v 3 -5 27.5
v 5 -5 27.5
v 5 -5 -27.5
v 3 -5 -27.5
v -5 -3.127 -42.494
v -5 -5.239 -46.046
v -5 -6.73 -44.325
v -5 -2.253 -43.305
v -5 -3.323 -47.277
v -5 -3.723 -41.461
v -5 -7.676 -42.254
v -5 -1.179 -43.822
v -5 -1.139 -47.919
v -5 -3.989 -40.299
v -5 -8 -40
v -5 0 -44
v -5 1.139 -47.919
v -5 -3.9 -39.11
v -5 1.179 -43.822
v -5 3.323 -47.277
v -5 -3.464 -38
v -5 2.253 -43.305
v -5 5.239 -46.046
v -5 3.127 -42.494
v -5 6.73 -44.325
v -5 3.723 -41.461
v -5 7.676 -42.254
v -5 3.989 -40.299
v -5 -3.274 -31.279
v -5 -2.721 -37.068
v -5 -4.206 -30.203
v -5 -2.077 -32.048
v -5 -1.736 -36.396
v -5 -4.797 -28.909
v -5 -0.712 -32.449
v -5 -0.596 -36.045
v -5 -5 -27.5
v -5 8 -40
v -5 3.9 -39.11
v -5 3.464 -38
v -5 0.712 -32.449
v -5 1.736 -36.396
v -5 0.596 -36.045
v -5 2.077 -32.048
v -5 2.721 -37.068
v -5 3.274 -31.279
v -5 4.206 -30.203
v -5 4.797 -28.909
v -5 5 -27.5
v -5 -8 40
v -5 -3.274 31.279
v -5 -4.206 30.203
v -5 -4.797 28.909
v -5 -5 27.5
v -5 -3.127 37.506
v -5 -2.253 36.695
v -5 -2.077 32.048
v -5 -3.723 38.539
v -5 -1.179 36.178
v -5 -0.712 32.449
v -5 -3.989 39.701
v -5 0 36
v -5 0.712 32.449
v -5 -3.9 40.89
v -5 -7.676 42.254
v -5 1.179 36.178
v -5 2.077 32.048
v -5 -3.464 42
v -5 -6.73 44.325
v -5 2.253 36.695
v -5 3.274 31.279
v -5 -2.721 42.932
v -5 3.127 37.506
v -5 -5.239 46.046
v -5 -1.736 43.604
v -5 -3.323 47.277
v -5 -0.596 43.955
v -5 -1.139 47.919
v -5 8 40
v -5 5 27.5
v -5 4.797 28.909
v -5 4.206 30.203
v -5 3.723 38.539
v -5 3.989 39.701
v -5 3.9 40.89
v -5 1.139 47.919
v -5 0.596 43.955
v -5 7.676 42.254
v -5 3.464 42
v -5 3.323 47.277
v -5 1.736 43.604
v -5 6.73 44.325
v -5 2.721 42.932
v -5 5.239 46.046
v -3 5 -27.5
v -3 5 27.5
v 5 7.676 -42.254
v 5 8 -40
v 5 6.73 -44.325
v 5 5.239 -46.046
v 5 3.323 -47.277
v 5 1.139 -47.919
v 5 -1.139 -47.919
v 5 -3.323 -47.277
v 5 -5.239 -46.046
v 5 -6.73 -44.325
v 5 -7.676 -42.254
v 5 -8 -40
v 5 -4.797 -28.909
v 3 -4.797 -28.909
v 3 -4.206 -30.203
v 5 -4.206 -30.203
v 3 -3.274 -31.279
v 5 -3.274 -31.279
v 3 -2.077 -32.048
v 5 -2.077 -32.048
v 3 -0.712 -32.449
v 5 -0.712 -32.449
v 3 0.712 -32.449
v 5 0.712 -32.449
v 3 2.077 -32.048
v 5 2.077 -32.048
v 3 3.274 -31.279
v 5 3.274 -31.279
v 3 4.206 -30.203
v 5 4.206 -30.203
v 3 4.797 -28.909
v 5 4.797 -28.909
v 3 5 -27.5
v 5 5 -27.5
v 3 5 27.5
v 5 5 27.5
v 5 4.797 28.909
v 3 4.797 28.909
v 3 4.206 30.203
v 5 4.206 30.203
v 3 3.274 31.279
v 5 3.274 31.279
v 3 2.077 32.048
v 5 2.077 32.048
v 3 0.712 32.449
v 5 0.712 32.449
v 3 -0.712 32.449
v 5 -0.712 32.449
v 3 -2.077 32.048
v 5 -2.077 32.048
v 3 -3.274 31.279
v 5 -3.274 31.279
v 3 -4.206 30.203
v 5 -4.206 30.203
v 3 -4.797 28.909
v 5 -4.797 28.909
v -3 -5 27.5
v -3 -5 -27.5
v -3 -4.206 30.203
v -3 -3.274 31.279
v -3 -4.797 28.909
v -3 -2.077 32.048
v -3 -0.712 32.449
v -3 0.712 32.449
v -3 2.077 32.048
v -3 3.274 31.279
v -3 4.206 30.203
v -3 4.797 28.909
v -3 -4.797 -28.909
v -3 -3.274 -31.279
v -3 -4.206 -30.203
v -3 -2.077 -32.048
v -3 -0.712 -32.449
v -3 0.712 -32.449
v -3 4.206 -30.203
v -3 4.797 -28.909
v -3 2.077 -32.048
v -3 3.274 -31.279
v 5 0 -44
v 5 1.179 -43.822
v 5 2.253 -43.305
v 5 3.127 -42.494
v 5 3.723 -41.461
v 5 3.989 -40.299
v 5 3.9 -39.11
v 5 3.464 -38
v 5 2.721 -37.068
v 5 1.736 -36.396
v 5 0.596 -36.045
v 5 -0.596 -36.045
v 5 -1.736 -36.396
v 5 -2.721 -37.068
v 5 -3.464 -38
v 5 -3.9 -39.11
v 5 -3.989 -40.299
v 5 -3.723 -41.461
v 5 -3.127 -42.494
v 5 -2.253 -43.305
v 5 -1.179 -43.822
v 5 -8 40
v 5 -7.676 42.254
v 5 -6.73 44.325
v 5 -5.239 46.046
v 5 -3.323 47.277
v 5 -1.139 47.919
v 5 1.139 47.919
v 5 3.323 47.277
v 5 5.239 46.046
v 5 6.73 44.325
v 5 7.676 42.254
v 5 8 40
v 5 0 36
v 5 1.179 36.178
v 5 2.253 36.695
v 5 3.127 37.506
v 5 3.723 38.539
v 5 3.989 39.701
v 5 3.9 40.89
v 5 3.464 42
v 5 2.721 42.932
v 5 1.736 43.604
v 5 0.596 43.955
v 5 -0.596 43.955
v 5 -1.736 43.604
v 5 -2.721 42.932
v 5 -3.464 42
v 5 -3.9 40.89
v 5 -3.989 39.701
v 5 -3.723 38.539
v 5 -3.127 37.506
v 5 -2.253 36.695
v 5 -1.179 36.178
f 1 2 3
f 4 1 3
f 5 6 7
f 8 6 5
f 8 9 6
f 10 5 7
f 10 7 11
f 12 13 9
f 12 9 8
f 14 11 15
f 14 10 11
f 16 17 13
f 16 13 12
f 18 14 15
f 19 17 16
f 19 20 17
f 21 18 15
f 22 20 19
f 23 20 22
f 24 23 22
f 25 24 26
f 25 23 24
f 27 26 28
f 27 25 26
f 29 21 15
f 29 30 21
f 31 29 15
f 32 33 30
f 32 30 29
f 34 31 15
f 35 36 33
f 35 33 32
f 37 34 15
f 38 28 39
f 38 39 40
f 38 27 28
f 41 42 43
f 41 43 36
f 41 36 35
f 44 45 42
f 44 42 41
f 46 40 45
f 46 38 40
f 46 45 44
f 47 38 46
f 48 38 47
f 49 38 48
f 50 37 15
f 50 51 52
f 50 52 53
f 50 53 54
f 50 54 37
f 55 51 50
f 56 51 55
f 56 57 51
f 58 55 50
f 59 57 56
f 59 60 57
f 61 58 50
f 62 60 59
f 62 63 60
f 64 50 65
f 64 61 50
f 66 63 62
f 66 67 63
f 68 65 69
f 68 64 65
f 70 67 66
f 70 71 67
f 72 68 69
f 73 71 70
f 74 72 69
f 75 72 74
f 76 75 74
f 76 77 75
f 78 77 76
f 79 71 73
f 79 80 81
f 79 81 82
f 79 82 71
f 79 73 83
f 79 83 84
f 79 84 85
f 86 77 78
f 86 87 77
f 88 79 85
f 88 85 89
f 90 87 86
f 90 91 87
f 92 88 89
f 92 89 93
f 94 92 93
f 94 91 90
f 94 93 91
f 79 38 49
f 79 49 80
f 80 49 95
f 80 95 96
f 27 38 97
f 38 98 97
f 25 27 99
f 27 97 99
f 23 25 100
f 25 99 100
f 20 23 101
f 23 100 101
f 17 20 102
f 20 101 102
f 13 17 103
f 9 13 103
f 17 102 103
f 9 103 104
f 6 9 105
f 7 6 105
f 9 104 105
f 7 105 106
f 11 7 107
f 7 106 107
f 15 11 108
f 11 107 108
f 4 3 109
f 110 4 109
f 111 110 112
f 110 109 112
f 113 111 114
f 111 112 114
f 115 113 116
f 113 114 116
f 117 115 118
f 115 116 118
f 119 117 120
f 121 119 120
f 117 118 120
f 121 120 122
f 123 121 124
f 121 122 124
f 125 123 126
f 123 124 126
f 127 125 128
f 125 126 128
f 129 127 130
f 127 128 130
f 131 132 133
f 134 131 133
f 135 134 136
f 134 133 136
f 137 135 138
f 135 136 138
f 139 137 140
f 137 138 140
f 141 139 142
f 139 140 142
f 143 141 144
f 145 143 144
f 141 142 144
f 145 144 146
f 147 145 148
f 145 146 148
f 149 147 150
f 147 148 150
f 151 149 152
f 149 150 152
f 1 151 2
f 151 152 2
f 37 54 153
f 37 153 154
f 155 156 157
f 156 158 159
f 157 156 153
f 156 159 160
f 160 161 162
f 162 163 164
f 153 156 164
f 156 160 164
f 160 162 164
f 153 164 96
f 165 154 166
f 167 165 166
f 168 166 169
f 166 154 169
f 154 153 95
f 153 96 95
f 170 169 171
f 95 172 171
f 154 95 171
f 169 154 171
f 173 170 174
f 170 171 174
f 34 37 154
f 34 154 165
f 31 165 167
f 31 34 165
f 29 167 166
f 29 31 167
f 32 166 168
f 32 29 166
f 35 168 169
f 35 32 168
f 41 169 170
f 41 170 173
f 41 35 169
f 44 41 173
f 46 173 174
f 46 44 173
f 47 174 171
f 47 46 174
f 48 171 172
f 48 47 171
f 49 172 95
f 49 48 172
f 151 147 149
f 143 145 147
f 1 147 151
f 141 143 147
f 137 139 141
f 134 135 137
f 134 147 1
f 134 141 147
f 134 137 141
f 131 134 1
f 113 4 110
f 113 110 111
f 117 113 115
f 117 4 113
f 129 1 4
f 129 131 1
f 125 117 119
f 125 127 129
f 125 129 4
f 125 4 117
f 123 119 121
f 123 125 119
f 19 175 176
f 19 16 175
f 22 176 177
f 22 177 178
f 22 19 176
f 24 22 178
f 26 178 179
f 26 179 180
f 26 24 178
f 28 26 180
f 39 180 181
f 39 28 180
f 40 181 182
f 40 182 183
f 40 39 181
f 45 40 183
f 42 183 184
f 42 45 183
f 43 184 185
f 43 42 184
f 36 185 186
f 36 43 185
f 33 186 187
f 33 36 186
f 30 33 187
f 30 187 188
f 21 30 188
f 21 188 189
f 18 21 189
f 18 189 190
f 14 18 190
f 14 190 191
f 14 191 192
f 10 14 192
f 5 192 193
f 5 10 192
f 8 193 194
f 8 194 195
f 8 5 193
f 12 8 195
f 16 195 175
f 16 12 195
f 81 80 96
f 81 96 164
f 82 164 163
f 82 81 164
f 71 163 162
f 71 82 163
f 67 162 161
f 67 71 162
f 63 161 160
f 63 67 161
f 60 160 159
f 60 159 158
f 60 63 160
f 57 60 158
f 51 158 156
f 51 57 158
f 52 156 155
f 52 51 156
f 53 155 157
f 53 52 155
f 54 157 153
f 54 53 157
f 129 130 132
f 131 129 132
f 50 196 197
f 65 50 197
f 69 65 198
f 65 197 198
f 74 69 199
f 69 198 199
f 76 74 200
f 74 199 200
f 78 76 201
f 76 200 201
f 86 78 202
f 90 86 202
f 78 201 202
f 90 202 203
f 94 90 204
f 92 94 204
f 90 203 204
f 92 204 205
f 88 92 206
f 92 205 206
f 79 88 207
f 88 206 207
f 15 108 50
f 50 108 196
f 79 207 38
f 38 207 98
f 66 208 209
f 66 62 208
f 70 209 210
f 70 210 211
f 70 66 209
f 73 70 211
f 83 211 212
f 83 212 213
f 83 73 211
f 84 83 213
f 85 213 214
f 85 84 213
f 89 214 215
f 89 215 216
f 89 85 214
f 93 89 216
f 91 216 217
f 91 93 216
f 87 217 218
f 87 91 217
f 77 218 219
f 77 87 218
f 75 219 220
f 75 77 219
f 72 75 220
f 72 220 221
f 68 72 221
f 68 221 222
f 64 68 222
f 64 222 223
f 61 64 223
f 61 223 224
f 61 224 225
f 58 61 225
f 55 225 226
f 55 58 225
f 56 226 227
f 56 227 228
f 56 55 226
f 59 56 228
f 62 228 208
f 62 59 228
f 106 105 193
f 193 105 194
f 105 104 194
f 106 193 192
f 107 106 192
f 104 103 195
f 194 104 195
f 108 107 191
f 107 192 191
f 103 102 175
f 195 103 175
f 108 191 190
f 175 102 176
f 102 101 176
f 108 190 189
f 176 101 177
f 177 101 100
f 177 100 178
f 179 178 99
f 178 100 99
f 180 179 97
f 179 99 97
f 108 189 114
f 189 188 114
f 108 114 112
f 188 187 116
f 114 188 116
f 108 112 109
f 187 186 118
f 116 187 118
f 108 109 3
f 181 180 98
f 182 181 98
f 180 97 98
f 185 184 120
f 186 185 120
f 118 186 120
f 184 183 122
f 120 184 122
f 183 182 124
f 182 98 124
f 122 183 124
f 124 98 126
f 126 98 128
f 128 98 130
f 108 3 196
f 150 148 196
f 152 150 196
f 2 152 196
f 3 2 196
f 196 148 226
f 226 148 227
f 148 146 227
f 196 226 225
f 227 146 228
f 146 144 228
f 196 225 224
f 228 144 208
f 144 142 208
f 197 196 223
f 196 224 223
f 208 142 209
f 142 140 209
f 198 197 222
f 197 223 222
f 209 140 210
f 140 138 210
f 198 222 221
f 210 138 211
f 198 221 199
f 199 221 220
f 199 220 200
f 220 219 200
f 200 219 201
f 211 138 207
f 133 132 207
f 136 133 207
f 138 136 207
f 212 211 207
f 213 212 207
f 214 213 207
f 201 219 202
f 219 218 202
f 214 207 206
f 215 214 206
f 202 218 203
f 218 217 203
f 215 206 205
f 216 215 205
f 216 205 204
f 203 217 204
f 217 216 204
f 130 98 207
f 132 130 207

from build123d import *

# Parameters (mm, degrees)
SKETCH_1_R          = 4
EXTRUDE_1_DEPTH     = 5
CUT_EXTRUDE_1_DEPTH = 2


with BuildPart() as part:
    # 草图1 → 凸台-拉伸1 (new body, symmetric)
    with BuildSketch(Plane(origin=(0, 0, 0), x_dir=(0, 0, -1), z_dir=(1, 0, 0))):
        with BuildLine():
            Line((-40, 8), (40, 8))
            ThreePointArc((40, 8), (48, 0), (40, -8))
            Line((40, -8), (-40, -8))
            ThreePointArc((-40, -8), (-48, 0), (-40, 8))
        make_face()
        with Locations((40, 0)):
            Circle(SKETCH_1_R, mode=Mode.SUBTRACT)
        with Locations((-40, 0)):
            Circle(SKETCH_1_R, mode=Mode.SUBTRACT)
    extrude(amount=EXTRUDE_1_DEPTH, both=True)

    # 草图2 → 切除-拉伸1 (cut)
    with BuildSketch(Plane.ZY.offset(5)):
        with BuildLine():
            Line((-27.5, 5), (27.5, 5))
            ThreePointArc((27.5, 5), (32.5, 0), (27.5, -5))
            Line((27.5, -5), (-27.5, -5))
            ThreePointArc((-27.5, -5), (-32.5, 0), (-27.5, 5))
        make_face()
    cut_extrude_1 = extrude(amount=-CUT_EXTRUDE_1_DEPTH, mode=Mode.SUBTRACT)

    # 镜向1: 切除-拉伸1 across plane
    add(cut_extrude_1.mirror(Plane(origin=(0, 0, 0), x_dir=(0, 0, 1), z_dir=(1, 0, 0))), mode=Mode.SUBTRACT)


solid = part.part
